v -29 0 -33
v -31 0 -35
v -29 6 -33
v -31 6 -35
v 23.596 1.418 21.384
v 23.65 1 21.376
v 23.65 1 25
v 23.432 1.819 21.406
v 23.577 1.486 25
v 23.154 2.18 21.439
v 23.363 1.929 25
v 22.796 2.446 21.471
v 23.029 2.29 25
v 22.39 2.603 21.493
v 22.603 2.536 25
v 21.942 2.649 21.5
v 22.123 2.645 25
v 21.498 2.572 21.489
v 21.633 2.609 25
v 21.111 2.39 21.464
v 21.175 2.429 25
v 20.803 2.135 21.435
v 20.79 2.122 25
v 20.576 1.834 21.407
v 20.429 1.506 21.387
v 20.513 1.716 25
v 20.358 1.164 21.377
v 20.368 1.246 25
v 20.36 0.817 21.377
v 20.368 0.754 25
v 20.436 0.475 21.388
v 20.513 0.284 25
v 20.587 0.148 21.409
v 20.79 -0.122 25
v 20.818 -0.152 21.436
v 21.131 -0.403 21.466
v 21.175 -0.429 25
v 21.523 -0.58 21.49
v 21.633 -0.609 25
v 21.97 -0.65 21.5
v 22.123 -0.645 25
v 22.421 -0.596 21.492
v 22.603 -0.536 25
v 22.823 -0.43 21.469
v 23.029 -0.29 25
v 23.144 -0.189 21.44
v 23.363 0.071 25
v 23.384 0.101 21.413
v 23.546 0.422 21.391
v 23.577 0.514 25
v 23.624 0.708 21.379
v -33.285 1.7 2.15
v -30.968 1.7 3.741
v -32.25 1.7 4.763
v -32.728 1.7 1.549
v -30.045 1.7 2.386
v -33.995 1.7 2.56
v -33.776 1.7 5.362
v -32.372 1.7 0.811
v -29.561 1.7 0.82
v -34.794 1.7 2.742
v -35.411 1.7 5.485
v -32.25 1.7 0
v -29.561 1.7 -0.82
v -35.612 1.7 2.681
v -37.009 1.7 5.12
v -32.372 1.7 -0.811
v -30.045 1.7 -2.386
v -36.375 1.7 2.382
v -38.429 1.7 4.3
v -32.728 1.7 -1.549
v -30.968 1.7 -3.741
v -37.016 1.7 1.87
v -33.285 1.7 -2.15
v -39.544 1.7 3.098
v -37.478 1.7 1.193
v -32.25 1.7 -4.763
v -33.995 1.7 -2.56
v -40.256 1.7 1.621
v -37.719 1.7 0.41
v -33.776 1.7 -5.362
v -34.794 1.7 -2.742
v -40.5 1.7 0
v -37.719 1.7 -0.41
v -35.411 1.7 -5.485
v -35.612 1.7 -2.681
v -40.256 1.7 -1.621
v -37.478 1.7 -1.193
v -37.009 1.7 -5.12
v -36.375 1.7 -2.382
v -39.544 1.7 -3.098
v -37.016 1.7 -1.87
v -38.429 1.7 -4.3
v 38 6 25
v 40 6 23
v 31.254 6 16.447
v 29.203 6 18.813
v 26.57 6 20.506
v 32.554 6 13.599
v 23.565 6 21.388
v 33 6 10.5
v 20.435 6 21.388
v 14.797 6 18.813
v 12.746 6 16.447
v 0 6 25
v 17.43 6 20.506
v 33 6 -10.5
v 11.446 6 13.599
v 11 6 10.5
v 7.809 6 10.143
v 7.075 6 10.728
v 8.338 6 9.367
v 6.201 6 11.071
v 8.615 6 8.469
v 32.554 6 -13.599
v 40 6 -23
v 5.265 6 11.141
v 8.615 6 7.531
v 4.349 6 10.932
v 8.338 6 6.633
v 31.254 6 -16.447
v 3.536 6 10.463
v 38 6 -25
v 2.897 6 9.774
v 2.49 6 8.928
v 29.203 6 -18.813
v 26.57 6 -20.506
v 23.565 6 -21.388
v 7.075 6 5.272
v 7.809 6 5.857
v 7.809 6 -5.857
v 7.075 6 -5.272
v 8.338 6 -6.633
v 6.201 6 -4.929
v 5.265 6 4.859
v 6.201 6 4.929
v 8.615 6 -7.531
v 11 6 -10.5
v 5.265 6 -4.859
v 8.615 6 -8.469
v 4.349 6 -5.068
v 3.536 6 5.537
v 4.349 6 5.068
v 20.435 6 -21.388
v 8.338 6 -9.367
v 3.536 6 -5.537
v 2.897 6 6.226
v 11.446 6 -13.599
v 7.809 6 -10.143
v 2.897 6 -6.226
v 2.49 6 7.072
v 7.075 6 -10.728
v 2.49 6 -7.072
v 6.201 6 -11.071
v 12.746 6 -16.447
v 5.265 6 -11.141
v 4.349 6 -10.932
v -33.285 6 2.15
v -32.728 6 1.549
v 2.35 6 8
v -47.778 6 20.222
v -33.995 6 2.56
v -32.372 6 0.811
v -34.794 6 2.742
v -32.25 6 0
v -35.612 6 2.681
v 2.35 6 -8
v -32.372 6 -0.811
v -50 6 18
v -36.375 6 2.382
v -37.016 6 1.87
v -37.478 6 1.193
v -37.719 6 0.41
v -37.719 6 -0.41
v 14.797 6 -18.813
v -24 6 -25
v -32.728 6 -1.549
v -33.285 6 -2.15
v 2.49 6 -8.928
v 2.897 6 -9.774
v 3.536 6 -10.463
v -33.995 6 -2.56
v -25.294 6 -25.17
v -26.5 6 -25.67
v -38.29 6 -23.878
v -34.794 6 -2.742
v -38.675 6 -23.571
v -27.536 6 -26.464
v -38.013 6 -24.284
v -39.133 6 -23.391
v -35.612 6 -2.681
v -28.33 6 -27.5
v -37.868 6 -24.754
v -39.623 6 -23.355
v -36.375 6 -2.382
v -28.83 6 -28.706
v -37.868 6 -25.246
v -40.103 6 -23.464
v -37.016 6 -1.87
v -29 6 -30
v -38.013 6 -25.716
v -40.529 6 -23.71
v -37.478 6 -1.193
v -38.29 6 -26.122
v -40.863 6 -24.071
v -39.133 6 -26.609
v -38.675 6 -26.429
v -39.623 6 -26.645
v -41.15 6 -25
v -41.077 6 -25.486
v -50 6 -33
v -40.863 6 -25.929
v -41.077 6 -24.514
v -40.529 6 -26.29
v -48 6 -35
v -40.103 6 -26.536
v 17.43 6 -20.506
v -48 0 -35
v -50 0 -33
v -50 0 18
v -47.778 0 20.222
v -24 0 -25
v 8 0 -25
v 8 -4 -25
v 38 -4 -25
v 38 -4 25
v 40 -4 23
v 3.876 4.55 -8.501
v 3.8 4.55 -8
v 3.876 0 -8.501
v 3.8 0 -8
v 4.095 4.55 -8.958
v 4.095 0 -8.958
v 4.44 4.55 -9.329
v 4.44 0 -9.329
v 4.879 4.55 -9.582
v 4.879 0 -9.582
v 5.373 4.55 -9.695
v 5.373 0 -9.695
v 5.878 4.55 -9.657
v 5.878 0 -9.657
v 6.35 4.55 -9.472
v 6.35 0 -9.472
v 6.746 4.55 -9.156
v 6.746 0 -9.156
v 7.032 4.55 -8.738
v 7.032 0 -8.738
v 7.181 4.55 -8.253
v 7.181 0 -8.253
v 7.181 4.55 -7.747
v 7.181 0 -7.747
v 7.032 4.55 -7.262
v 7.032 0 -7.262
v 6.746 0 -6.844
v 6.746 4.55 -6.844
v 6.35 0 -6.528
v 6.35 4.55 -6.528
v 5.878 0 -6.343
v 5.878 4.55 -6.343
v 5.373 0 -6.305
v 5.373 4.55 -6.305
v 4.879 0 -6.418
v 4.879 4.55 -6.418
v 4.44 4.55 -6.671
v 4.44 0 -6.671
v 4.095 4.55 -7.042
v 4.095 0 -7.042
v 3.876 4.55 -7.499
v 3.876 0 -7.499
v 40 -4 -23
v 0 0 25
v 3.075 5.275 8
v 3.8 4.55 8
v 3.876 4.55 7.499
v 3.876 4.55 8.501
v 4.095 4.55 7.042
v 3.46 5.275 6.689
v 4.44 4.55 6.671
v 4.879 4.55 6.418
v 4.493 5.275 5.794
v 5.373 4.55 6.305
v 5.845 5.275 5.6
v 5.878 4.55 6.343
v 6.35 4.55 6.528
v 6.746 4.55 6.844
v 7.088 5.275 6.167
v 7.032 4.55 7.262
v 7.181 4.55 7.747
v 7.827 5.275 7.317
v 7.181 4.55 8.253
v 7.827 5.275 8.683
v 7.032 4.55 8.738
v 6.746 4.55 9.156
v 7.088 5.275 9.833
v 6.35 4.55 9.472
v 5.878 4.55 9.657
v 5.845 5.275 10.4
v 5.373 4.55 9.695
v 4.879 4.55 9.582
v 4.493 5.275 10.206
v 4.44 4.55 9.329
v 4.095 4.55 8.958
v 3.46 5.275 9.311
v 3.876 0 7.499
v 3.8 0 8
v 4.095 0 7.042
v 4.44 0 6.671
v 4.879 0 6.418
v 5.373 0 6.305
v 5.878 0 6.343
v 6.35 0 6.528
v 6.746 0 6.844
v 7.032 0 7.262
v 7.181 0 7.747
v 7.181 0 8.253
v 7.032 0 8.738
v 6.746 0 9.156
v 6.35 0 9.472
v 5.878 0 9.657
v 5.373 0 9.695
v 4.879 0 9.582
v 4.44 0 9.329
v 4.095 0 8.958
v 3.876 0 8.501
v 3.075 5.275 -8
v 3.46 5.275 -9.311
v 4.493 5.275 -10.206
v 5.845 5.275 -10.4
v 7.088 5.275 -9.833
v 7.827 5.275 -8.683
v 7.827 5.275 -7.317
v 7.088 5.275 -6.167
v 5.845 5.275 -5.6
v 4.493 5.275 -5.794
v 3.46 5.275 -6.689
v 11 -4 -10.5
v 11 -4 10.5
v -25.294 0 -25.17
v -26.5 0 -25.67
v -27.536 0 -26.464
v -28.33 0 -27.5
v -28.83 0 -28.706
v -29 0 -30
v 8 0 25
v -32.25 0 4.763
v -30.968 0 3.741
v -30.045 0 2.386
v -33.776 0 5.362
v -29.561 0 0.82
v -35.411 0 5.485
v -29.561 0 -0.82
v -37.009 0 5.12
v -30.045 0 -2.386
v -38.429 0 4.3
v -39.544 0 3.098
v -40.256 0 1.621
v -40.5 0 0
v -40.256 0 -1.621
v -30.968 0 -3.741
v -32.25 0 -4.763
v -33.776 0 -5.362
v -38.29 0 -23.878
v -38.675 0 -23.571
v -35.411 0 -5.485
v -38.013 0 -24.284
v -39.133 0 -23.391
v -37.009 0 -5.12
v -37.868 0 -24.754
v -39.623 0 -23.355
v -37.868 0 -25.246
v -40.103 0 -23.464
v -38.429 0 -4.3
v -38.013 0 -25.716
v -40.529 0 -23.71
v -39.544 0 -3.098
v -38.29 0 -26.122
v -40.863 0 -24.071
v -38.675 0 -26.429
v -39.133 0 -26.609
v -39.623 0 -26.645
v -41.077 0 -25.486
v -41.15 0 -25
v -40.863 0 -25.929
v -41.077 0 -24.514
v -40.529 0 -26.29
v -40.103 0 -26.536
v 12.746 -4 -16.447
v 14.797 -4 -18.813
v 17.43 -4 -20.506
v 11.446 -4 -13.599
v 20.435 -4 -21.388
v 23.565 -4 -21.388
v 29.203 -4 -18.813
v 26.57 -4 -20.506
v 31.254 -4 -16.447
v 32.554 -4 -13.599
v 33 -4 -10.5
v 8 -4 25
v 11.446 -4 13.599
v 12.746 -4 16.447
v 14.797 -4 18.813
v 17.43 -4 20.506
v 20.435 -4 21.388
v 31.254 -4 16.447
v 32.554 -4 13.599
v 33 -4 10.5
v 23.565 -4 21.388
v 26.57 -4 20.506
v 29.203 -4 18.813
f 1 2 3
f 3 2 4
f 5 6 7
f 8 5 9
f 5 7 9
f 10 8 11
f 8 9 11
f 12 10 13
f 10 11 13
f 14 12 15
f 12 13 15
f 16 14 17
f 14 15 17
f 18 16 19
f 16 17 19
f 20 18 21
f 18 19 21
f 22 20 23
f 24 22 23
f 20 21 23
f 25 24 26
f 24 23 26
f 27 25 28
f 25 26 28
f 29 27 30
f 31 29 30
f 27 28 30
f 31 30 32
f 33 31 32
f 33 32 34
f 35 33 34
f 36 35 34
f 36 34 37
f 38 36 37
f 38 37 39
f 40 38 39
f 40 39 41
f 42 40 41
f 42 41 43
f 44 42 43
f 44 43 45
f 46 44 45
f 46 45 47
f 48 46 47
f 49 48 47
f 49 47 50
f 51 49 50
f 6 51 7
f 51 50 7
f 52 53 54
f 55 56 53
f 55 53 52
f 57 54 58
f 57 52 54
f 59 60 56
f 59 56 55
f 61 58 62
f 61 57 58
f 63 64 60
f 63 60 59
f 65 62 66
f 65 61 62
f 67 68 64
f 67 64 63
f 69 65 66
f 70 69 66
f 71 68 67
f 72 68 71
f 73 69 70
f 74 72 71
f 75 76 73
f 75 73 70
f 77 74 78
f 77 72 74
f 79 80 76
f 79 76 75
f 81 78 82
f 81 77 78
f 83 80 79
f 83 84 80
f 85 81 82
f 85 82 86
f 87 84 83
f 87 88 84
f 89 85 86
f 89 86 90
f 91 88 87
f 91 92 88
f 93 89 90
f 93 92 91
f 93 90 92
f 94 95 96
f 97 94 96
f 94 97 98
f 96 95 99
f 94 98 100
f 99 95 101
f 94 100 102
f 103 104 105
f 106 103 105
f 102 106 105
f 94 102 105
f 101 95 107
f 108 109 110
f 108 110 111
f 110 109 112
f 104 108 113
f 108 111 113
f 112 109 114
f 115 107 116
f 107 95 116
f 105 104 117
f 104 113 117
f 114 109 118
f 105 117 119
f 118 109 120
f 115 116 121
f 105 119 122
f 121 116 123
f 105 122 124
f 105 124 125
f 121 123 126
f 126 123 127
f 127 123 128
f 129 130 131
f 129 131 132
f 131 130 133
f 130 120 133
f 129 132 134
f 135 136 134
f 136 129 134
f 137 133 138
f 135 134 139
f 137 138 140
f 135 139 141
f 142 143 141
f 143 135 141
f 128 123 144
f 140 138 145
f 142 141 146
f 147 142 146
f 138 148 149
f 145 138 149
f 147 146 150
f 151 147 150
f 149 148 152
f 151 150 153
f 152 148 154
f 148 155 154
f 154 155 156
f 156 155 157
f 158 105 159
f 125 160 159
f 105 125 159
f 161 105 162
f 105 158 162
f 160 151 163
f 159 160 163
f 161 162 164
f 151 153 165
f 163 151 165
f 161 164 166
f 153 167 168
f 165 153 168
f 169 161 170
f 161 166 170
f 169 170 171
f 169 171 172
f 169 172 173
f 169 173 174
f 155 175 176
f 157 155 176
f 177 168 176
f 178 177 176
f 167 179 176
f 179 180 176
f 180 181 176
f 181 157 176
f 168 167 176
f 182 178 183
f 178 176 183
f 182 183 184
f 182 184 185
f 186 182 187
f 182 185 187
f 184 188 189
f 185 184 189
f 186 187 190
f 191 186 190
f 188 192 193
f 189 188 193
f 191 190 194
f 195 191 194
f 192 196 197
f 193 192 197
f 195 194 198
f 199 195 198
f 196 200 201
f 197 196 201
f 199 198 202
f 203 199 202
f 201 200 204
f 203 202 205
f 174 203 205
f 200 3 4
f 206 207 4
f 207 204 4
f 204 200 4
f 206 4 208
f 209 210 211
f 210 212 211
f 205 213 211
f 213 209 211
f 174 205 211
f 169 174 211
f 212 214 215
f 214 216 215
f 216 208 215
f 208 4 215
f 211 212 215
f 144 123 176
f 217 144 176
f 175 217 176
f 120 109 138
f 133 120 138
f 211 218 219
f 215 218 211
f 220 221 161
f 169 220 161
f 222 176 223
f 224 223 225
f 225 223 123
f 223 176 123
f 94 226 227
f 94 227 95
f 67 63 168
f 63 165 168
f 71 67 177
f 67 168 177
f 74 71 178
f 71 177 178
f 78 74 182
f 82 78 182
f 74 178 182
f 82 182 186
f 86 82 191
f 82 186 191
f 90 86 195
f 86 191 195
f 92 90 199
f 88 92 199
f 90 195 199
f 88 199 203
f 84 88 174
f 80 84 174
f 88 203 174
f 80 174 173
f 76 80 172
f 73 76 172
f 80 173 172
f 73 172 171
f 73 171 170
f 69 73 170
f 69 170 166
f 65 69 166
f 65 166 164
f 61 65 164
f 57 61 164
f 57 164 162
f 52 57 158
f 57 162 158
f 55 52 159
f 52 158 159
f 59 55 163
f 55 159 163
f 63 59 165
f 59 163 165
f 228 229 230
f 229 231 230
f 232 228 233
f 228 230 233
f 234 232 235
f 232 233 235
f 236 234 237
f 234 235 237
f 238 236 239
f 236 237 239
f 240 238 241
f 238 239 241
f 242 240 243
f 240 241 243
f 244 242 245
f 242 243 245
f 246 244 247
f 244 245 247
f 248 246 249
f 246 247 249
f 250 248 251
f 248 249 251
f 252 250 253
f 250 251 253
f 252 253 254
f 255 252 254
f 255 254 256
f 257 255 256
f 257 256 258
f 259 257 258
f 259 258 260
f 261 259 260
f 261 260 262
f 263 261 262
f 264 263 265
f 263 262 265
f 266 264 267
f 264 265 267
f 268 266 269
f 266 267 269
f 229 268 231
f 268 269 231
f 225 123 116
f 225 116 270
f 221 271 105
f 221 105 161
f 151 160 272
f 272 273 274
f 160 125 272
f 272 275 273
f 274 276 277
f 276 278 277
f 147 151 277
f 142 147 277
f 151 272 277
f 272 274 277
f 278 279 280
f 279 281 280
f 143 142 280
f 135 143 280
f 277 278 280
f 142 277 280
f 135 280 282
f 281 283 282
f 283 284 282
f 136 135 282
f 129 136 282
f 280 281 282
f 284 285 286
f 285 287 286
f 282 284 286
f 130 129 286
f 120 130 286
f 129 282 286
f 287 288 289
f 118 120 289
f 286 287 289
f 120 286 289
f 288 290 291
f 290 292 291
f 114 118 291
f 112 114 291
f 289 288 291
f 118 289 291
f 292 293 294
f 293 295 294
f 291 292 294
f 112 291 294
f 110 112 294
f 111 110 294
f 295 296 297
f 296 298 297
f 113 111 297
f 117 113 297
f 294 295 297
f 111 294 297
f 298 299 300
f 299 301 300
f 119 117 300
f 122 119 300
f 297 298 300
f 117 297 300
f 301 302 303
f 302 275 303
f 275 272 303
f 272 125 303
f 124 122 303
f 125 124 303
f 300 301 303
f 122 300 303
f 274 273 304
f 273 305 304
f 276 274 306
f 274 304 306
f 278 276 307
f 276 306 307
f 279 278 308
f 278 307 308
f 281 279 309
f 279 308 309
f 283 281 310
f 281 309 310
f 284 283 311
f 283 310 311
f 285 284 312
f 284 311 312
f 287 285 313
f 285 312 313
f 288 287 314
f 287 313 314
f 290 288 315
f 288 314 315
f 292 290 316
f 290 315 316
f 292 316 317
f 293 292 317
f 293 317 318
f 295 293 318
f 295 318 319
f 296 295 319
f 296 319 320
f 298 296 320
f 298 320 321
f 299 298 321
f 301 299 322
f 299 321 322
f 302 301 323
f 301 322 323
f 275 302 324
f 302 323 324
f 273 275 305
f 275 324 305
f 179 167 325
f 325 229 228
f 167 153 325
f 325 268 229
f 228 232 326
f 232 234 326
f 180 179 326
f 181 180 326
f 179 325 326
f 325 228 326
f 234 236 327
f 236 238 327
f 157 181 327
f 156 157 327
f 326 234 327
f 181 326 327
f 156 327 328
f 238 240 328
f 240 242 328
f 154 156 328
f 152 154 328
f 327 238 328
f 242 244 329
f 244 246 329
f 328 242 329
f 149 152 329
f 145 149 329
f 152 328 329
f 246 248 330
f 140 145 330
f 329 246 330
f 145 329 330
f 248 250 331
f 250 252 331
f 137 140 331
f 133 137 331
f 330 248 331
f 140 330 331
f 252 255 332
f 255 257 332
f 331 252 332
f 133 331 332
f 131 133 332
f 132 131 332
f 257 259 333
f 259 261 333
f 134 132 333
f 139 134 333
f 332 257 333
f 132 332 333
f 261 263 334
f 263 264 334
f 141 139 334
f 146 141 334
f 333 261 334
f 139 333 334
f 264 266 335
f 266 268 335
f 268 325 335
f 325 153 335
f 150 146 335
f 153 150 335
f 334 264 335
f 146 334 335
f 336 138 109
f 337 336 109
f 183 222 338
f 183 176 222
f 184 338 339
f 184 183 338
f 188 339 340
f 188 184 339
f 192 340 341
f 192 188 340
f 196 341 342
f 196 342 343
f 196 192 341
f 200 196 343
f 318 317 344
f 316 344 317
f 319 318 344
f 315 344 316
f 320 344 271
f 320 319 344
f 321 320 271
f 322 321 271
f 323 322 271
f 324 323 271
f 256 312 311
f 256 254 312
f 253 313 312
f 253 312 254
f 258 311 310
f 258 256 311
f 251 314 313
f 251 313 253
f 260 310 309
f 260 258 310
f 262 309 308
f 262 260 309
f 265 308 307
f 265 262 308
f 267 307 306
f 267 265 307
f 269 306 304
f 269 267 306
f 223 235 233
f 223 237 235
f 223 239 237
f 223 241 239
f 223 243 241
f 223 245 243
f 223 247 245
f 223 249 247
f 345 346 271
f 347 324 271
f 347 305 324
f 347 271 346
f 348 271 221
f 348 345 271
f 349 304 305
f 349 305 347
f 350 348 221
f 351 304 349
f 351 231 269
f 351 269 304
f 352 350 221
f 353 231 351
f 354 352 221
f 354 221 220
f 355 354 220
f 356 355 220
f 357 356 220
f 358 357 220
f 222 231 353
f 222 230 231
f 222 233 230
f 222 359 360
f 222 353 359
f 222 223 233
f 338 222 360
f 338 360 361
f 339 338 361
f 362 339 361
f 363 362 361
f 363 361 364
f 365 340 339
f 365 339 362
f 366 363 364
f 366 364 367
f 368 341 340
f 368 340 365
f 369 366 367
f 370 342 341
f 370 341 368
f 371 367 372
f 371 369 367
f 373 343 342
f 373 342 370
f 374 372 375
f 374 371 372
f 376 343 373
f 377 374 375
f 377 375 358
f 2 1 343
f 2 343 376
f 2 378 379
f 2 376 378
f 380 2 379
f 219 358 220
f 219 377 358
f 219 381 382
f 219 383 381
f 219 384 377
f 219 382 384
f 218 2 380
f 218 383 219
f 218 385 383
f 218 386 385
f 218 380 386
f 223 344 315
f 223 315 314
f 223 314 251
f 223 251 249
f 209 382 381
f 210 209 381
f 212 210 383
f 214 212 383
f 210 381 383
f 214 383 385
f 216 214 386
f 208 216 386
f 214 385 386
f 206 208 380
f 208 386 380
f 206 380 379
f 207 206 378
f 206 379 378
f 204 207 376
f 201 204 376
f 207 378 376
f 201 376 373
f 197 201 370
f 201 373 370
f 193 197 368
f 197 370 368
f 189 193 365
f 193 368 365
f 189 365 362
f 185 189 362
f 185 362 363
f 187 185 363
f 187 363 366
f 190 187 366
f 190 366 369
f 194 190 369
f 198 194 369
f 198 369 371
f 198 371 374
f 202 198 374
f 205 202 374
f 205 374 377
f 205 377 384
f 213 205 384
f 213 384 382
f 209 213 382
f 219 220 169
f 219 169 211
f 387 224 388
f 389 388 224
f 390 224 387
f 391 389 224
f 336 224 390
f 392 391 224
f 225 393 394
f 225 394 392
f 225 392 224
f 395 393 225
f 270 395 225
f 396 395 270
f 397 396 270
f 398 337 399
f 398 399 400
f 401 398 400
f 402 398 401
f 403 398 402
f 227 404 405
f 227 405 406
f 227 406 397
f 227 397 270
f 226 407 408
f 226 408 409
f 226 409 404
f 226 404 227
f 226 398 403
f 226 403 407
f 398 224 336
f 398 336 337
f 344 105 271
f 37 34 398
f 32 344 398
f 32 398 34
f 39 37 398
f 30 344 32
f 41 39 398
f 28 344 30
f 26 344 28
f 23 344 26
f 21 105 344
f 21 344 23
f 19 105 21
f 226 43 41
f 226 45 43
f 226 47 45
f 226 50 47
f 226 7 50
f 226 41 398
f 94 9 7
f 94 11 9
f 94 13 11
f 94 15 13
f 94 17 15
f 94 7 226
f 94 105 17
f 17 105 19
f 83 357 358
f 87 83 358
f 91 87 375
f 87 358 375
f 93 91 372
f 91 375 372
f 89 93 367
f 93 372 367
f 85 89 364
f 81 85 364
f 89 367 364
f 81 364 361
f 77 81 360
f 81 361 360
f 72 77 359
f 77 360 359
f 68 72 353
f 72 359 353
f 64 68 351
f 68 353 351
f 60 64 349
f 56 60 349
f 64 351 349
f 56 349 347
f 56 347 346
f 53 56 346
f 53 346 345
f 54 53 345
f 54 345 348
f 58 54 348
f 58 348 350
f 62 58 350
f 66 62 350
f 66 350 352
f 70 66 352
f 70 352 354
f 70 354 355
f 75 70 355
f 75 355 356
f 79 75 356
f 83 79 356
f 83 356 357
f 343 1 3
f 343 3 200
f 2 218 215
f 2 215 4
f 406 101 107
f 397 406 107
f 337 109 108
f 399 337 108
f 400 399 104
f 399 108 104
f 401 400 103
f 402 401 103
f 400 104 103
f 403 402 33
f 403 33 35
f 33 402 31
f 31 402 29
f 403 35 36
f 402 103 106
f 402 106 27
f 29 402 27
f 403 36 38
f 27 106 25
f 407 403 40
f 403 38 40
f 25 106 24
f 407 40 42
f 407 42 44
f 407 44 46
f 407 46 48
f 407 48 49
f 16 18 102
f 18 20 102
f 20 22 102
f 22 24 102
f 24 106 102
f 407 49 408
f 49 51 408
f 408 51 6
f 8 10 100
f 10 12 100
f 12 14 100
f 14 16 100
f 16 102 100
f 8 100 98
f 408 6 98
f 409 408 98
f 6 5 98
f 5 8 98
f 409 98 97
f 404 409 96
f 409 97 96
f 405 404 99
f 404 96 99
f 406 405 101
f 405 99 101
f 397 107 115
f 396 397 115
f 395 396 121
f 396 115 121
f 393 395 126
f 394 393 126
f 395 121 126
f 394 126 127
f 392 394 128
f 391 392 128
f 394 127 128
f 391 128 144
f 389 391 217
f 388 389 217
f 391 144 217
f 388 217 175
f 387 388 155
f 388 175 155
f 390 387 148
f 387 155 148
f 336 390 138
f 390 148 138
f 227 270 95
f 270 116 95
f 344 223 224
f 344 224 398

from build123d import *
from OCP.BRepFilletAPI import BRepFilletAPI_MakeChamfer

# Parameters (mm, degrees)
AUFSATZ_LINEAR_AUSTRAGEN1_DEPTH                      = 6
SKIZZE8_W                                            = 32
SKIZZE8_H                                            = 50
AUFSATZ_LINEAR_AUSTRAGEN2_DEPTH                      = 4
SCHNITT_LINEAR_AUSTRAGEN1_DEPTH                      = 62.846584384
STIRNSENKUNG_F_R_M5_FLACHKOPFSCHRAUBE_MI_D           = 5.5
STIRNSENKUNG_F_R_M5_FLACHKOPFSCHRAUBE_MI_DEPTH       = 20
STIRNSENKUNG_F_R_M5_FLACHKOPFSCHRAUBE_MI_CBORE_D     = 11
STIRNSENKUNG_F_R_M5_FLACHKOPFSCHRAUBE_MI_CBORE_DEPTH = 1.7
STIRNSENKUNG_F_R_M5_FLACHKOPFSCHRAUBE_MI_TIP         = 1.652366702
FORMSENKUNG_F_R_M3_LINSENSENKSCHRAUBE_MI_D           = 3.4
FORMSENKUNG_F_R_M3_LINSENSENKSCHRAUBE_MI_DEPTH       = 8.5
FORMSENKUNG_F_R_M3_LINSENSENKSCHRAUBE_MI_CSINK_D     = 6.3
FORMSENKUNG_F_R_M3_LINSENSENKSCHRAUBE_MI_CSINK_ANGLE = 90
FORMSENKUNG_F_R_M3_LINSENSENKSCHRAUBE_MI_TIP         = 1.021463052
FASE1_SIZE                                           = 2
FASE1_SIZE2                                          = 2.233305694
VERRUNDUNG1_R                                        = 5
M4_GEWINDEBOHRUNG1_D                                 = 3.3
M4_GEWINDEBOHRUNG2_REACH                             = 80.333
M4_GEWINDEBOHRUNG2_BORE_R                            = 1.65


with BuildPart() as part:
    # Skizze1 → Aufsatz-Linear austragen1 (new body)
    with BuildSketch(Plane(origin=(0, 0, 0), x_dir=(1, 0, 0), z_dir=(0, 1, 0))):
        Polygon((-50, 35), (-29, 35), (-29, 25), (40, 25), (40, -25), (0, -25), (-50, -20), align=None)
    extrude(amount=AUFSATZ_LINEAR_AUSTRAGEN1_DEPTH)

    # Skizze8 → Aufsatz-Linear austragen2 (add)
    with BuildSketch(Plane.XZ):
        with Locations((24, 0)):
            Rectangle(SKIZZE8_W, SKIZZE8_H)
    extrude(amount=AUFSATZ_LINEAR_AUSTRAGEN2_DEPTH)

    # Skizze4 → Schnitt-Linear austragen1 (cut, through all)
    with BuildSketch(Plane(origin=(0, 6, 0), x_dir=(1, 0, 0), z_dir=(0, 1, 0))):
        with BuildLine():
            Line((11, 10.5), (11, -10.5))
            ThreePointArc((11, -10.5), (22, -21.5), (33, -10.5))
            Line((33, -10.5), (33, 10.5))
            ThreePointArc((33, 10.5), (22, 21.5), (11, 10.5))
        make_face()
    extrude(amount=-SCHNITT_LINEAR_AUSTRAGEN1_DEPTH, mode=Mode.SUBTRACT)

    # Stirnsenkung für M5 Flachkopfschraube mit Schlitz2
    with Locations(Plane(origin=(0, 0, 0), x_dir=(-1, 0, 0), z_dir=(0, -1, 0))):
        with Locations((35, 0)):
            CounterBoreHole(STIRNSENKUNG_F_R_M5_FLACHKOPFSCHRAUBE_MI_D / 2, STIRNSENKUNG_F_R_M5_FLACHKOPFSCHRAUBE_MI_CBORE_D / 2, STIRNSENKUNG_F_R_M5_FLACHKOPFSCHRAUBE_MI_CBORE_DEPTH, depth=STIRNSENKUNG_F_R_M5_FLACHKOPFSCHRAUBE_MI_DEPTH)
            with Locations((0, 0, -(STIRNSENKUNG_F_R_M5_FLACHKOPFSCHRAUBE_MI_DEPTH + STIRNSENKUNG_F_R_M5_FLACHKOPFSCHRAUBE_MI_TIP / 2))):  # 118° drill point
                Cone(0, STIRNSENKUNG_F_R_M5_FLACHKOPFSCHRAUBE_MI_D / 2, STIRNSENKUNG_F_R_M5_FLACHKOPFSCHRAUBE_MI_TIP, mode=Mode.SUBTRACT)

    # Formsenkung für M3 Linsensenkschraube mit Schlitz1
    with Locations(Plane(origin=(0, 6, 0), x_dir=(1, 0, 0), z_dir=(0, 1, 0))):
        with Locations((5.5, 8), (5.5, -8)):
            CounterSinkHole(FORMSENKUNG_F_R_M3_LINSENSENKSCHRAUBE_MI_D / 2, FORMSENKUNG_F_R_M3_LINSENSENKSCHRAUBE_MI_CSINK_D / 2, depth=FORMSENKUNG_F_R_M3_LINSENSENKSCHRAUBE_MI_DEPTH, counter_sink_angle=FORMSENKUNG_F_R_M3_LINSENSENKSCHRAUBE_MI_CSINK_ANGLE)
            with Locations((0, 0, -(FORMSENKUNG_F_R_M3_LINSENSENKSCHRAUBE_MI_DEPTH + FORMSENKUNG_F_R_M3_LINSENSENKSCHRAUBE_MI_TIP / 2))):  # 118° drill point
                Cone(0, FORMSENKUNG_F_R_M3_LINSENSENKSCHRAUBE_MI_D / 2, FORMSENKUNG_F_R_M3_LINSENSENKSCHRAUBE_MI_TIP, mode=Mode.SUBTRACT)

    # Fase1: one chamfer whose edges measure the first distance from different faces: ONE call of the kernel's chamfer builder (chamfer() names one face for all edges)
    fase1_edges_1 = [part.edges().sort_by_distance(p)[0] for p in [
        (40, 1, 25),
        (-50, 3, -35),
        (-29, 3, -35),
        (40, 1, -25),
    ]]
    fase1_edges_2 = [part.edges().sort_by_distance(p)[0] for p in [
        (-50, 3, 20),
    ]]
    fase1_side_2 = [part.faces().sort_by_distance(p)[0] for p in [
        (-50, 3, -7.5),
    ]]
    fase1 = BRepFilletAPI_MakeChamfer(part.part.solid().wrapped)
    for e in fase1_edges_1:
        fase1.Add(FASE1_SIZE, e.wrapped)
    for e in fase1_edges_2:
        fase1.Add(FASE1_SIZE, FASE1_SIZE2, e.wrapped, fase1_side_2[0].wrapped)  # the first distance lies on this face
    add(Compound.cast(fase1.Shape()), mode=Mode.REPLACE)

    # Verrundung1
    verrundung1_edges = [part.edges().sort_by_distance(p)[0] for p in [
        (-29, 3, -25),
    ]]
    fillet(verrundung1_edges, radius=VERRUNDUNG1_R)

    # M4 Gewindebohrung1 (through all)
    with Locations(Plane(origin=(0, 6, 0), x_dir=(1, 0, 0), z_dir=(0, 1, 0))):
        with Locations((-39.5, 25)):
            Hole(M4_GEWINDEBOHRUNG1_D / 2)

    # M4 Gewindebohrung2 bore → M4 Gewindebohrung2 (cut, up to next)
    with BuildSketch(Plane.XY.offset(25), mode=Mode.PRIVATE) as m4_gewindebohrung2_sk1:
        with Locations((22, 1)):
            Circle(M4_GEWINDEBOHRUNG2_BORE_R)
    m4_gewindebohrung2_tool1 = extrude(m4_gewindebohrung2_sk1.sketch, amount=-M4_GEWINDEBOHRUNG2_REACH, mode=Mode.PRIVATE) & part.part
    add(m4_gewindebohrung2_tool1.solids().sort_by_distance((22, 1, 25))[0], mode=Mode.SUBTRACT)


solid = part.part
